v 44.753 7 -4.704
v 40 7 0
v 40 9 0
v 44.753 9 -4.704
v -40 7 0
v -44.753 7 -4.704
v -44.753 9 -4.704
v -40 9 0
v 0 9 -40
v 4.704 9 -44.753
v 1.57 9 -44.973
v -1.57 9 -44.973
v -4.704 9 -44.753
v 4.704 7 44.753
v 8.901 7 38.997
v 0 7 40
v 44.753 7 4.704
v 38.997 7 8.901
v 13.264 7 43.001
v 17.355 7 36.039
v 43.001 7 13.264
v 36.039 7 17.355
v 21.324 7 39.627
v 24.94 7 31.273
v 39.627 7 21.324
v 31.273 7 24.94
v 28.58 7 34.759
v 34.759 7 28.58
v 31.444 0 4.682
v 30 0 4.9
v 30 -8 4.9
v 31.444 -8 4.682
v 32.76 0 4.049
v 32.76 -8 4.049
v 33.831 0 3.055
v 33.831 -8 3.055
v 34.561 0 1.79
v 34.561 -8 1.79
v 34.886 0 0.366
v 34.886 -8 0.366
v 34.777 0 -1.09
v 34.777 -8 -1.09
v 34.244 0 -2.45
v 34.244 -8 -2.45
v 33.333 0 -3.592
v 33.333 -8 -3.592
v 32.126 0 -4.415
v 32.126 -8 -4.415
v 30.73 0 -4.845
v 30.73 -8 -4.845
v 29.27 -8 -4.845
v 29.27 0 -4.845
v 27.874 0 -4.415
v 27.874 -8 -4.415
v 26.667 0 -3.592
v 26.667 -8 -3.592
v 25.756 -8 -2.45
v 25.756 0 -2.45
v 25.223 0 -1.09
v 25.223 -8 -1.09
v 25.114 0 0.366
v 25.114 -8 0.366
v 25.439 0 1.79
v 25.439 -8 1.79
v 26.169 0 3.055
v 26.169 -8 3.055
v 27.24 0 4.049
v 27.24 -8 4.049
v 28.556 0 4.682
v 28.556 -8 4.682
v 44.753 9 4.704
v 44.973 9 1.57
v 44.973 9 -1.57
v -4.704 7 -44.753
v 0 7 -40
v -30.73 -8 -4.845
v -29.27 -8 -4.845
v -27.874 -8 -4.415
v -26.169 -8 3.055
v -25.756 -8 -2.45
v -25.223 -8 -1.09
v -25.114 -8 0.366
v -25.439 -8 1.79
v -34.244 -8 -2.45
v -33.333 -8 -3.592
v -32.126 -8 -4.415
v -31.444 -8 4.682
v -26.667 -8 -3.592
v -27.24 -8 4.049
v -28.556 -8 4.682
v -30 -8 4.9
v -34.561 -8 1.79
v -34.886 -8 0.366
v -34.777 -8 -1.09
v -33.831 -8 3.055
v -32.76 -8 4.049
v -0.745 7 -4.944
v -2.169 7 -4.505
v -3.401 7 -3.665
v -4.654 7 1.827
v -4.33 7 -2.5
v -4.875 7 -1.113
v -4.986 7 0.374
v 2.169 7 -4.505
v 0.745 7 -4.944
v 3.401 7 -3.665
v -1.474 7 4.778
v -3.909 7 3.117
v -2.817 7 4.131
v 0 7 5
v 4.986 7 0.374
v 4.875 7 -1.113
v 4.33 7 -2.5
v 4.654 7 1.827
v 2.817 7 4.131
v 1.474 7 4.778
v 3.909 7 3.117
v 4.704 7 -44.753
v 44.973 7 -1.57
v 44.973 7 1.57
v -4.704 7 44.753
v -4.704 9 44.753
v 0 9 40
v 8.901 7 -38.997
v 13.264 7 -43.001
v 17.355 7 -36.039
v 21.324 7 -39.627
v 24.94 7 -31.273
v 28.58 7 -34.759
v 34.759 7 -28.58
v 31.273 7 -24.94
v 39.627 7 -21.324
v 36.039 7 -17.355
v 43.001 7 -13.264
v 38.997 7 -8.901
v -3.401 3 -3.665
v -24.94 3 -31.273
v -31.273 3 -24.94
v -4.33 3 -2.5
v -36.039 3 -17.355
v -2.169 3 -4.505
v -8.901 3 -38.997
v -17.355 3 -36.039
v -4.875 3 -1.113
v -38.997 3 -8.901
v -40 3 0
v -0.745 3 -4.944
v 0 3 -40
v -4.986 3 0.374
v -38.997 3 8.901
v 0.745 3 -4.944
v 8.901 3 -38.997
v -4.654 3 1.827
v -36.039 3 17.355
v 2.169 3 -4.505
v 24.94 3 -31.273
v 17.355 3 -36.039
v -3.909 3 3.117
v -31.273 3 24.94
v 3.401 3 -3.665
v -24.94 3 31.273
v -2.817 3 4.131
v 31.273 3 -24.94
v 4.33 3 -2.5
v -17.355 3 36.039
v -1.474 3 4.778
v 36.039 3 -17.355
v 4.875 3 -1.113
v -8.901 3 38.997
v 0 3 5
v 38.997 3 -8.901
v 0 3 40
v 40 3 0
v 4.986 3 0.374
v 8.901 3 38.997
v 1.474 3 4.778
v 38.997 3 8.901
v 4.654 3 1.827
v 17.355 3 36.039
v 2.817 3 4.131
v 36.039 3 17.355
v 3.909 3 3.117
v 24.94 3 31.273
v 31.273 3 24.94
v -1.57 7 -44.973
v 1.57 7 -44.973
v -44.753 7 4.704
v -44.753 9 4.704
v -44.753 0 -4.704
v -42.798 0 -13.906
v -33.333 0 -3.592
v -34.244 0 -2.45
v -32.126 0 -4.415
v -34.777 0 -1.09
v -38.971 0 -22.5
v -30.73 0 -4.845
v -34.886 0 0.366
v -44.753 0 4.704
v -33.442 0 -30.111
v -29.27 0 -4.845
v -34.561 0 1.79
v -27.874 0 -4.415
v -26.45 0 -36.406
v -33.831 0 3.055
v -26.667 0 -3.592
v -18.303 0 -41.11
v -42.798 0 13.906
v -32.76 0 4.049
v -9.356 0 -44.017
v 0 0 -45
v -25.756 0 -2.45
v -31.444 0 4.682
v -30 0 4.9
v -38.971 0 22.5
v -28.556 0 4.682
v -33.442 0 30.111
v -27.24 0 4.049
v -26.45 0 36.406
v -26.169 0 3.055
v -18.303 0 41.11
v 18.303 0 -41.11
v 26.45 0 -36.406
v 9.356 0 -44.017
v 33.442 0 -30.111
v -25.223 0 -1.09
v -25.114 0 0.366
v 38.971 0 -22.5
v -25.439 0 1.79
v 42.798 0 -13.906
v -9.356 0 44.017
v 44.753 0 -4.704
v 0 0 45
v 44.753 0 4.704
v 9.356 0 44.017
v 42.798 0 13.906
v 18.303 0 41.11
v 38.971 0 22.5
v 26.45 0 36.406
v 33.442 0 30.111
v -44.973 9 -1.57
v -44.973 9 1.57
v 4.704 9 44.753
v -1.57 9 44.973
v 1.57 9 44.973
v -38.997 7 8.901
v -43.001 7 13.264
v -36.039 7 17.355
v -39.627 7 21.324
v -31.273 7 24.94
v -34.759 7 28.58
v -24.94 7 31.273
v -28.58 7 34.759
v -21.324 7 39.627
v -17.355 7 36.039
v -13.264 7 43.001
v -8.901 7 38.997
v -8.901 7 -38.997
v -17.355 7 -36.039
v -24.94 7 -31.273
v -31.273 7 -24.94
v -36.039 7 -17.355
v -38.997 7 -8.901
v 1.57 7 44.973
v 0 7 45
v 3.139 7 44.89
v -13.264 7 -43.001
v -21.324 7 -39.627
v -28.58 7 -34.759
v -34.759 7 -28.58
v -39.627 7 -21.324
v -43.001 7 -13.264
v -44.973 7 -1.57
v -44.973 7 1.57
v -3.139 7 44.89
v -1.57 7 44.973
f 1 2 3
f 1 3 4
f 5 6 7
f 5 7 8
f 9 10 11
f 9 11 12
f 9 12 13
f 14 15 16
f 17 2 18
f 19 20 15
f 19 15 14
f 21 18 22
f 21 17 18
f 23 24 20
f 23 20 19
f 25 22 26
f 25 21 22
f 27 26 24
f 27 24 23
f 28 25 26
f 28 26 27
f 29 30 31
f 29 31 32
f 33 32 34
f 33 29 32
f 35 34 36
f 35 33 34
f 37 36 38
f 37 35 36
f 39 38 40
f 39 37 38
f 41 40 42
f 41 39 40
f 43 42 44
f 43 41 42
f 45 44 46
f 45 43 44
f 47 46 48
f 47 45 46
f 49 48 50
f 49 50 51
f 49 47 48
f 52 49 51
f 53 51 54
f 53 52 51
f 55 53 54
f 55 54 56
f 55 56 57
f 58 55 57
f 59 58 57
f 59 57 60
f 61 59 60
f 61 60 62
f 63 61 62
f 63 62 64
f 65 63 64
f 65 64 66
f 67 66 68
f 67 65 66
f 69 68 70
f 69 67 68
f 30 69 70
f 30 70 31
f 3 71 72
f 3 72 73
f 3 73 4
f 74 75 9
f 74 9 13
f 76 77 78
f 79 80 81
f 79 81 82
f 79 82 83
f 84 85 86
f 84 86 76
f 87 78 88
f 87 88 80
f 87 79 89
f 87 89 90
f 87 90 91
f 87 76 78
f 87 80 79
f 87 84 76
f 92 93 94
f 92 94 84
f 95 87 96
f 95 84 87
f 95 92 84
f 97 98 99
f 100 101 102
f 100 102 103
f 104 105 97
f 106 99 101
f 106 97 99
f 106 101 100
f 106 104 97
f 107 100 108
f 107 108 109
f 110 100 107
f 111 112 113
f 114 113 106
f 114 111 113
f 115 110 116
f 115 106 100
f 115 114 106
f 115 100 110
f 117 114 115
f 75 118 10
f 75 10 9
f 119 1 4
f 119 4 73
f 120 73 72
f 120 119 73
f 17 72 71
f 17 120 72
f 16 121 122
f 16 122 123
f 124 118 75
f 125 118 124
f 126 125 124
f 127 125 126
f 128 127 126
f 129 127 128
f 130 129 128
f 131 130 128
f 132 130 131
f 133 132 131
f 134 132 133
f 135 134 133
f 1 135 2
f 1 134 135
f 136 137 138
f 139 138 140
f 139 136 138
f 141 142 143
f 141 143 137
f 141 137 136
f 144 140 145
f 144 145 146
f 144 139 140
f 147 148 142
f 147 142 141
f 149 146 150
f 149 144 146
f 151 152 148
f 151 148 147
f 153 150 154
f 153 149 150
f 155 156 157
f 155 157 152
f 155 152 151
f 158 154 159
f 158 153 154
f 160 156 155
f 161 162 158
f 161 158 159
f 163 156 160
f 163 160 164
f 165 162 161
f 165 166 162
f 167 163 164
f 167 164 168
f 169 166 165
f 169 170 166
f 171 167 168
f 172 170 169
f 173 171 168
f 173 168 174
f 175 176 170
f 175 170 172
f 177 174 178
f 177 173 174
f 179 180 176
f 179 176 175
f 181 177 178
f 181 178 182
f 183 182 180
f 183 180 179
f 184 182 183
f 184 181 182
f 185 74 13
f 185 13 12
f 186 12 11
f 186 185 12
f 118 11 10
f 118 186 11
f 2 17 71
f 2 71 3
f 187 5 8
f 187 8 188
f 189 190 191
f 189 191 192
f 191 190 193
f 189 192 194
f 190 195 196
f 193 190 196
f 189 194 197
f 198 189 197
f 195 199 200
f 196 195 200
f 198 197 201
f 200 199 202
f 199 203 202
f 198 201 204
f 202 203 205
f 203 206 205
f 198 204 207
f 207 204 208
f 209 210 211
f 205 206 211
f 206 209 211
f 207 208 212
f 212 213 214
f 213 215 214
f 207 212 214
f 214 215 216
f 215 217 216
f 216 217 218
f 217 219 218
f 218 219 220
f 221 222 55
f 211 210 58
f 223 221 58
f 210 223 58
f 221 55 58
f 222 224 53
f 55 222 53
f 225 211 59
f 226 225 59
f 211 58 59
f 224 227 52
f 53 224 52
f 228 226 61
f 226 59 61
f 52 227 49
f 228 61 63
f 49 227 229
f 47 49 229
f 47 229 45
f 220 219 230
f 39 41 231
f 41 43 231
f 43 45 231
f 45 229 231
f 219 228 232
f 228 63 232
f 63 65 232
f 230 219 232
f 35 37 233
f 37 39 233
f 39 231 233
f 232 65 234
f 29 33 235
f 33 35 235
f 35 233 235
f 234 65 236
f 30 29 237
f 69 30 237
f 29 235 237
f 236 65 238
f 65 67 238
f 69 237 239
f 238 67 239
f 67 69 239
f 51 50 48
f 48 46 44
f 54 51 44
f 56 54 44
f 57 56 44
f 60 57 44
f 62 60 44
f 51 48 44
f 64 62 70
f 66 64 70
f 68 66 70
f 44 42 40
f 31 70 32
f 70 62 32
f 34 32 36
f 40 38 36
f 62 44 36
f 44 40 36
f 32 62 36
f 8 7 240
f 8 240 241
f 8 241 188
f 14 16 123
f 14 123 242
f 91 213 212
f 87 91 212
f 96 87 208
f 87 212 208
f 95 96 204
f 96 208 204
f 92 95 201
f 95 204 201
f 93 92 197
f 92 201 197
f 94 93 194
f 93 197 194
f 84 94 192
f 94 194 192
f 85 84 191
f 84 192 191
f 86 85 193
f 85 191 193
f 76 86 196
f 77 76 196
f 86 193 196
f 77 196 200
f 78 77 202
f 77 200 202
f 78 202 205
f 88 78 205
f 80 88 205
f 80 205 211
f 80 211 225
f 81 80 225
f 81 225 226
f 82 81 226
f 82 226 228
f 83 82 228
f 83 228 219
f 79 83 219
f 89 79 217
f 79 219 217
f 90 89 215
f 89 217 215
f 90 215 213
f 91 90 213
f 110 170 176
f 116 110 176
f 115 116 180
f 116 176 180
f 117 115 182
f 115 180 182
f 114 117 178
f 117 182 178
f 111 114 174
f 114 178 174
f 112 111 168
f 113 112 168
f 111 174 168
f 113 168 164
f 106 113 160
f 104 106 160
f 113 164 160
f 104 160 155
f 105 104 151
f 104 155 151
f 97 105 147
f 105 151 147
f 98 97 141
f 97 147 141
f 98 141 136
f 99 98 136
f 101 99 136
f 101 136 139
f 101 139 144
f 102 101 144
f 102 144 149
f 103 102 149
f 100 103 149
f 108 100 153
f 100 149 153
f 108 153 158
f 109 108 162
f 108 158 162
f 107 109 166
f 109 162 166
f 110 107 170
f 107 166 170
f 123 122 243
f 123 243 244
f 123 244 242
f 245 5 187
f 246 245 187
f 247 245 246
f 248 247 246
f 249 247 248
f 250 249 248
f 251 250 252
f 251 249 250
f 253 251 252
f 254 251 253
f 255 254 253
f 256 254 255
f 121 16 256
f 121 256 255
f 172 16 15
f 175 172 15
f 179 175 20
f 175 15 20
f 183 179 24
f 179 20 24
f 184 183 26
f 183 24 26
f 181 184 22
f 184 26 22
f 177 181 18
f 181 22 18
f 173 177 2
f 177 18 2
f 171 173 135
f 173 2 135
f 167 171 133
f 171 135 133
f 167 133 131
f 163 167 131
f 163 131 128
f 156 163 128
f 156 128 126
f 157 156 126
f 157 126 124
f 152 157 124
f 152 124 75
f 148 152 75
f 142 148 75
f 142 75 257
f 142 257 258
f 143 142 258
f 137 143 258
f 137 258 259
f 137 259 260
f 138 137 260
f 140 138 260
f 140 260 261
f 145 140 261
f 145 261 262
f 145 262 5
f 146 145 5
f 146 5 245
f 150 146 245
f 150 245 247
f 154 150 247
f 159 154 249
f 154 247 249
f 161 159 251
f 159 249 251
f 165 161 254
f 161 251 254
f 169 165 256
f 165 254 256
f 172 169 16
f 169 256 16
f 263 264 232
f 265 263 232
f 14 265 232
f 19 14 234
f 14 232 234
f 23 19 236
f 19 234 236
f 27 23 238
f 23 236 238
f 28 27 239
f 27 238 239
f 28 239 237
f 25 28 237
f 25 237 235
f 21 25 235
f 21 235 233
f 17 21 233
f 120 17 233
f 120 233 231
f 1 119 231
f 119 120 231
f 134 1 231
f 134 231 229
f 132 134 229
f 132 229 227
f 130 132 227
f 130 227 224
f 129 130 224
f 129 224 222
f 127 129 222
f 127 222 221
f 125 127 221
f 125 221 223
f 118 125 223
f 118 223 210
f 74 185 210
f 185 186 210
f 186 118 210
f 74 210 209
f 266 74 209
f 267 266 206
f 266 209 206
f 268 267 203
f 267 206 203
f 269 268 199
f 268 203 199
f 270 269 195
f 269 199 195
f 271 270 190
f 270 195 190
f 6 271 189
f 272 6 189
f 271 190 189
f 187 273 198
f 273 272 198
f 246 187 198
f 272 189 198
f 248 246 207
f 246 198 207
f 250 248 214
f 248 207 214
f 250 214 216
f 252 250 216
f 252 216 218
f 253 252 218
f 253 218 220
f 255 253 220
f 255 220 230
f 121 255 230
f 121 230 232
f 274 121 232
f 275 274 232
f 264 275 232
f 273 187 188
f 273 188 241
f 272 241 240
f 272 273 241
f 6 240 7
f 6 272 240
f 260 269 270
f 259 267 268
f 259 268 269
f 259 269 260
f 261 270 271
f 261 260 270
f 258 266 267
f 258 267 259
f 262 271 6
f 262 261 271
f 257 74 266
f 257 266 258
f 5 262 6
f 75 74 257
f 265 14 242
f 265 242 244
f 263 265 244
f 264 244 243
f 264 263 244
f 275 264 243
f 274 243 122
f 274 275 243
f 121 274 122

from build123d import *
from build123d.topology import SkipClean

# Parameters (mm, degrees)
SKETCH1_R           = 45
BOSS_EXTRUDE1_DEPTH = 7
SKETCH2_R           = 40
CUT_EXTRUDE1_DEPTH  = 4
SKETCH3_R           = 5
BOSS_EXTRUDE2_DEPTH = 4
BOSS_EXTRUDE3_DEPTH = 2
CIRPATTERN1_COUNT   = 4
SKETCH5_R           = 4.9
BOSS_EXTRUDE4_DEPTH = 8


with BuildPart() as part:
    # Sketch1 → Boss-Extrude1 (new body)
    with BuildSketch(Plane(origin=(0, 0, 0), x_dir=(1, 0, 0), z_dir=(0, 1, 0))):
        with Locations(Location((0, 0, 0), (0, 0, 270))):
            Circle(SKETCH1_R)
    extrude(amount=BOSS_EXTRUDE1_DEPTH)

    # Sketch2 → Cut-Extrude1 (cut)
    with BuildSketch(Plane(origin=(0, 7, 0), x_dir=(1, 0, 0), z_dir=(0, 1, 0))):
        with Locations(Location((0, 0, 0), (0, 0, 270))):
            Circle(SKETCH2_R)
    extrude(amount=-CUT_EXTRUDE1_DEPTH, mode=Mode.SUBTRACT)

    # Sketch3 → Boss-Extrude2 (add)
    with BuildSketch(Plane(origin=(0, 3, 0), x_dir=(1, 0, 0), z_dir=(0, 1, 0))):
        with Locations(Location((0, 0, 0), (0, 0, 270))):
            Circle(SKETCH3_R)
    extrude(amount=BOSS_EXTRUDE2_DEPTH)

    # Sketch4 → Boss-Extrude3 (add)
    with SkipClean():  # the faces are left unmerged after this step: merging them gives an invalid solid
        with BuildSketch(Plane(origin=(0, 7, 0), x_dir=(1, 0, 0), z_dir=(0, 1, 0))):
            with BuildLine():
                Line((0, 40), (-4.703780847, 44.753485292))
                ThreePointArc((-4.703780847, 44.753485292), (0, 45), (4.703780847, 44.753485292))
                Line((4.703780847, 44.753485292), (0, 40))
            make_face()
        boss_extrude3 = extrude(amount=BOSS_EXTRUDE3_DEPTH)

    # CirPattern1: Boss-Extrude3 ×4 about axis
    with SkipClean():  # the faces are left unmerged after this step: merging them gives an invalid solid
        cirpattern1_axis = Axis((0, 0, 0), (0, 1, 0))
        for i in range(1, CIRPATTERN1_COUNT):
            add(boss_extrude3.rotate(cirpattern1_axis, i * 360 / CIRPATTERN1_COUNT))

    # Sketch5 → Boss-Extrude4 (add)
    with SkipClean():  # the faces are left unmerged after this step: merging them gives an invalid solid
        with BuildSketch(Plane(origin=(0, 0, 0), x_dir=(-1, 0, 0), z_dir=(0, -1, 0))):
            with Locations(Location((30, 0, 0), (0, 0, 270))):
                Circle(SKETCH5_R)
        boss_extrude4 = extrude(amount=BOSS_EXTRUDE4_DEPTH)

    # Mirror1: Boss-Extrude4 across plane
    with SkipClean():  # the faces are left unmerged after this step: merging them gives an invalid solid
        add(boss_extrude4.mirror(Plane(origin=(0, 0, 0), x_dir=(0, 0, 1), z_dir=(1, 0, 0))))


solid = part.part
